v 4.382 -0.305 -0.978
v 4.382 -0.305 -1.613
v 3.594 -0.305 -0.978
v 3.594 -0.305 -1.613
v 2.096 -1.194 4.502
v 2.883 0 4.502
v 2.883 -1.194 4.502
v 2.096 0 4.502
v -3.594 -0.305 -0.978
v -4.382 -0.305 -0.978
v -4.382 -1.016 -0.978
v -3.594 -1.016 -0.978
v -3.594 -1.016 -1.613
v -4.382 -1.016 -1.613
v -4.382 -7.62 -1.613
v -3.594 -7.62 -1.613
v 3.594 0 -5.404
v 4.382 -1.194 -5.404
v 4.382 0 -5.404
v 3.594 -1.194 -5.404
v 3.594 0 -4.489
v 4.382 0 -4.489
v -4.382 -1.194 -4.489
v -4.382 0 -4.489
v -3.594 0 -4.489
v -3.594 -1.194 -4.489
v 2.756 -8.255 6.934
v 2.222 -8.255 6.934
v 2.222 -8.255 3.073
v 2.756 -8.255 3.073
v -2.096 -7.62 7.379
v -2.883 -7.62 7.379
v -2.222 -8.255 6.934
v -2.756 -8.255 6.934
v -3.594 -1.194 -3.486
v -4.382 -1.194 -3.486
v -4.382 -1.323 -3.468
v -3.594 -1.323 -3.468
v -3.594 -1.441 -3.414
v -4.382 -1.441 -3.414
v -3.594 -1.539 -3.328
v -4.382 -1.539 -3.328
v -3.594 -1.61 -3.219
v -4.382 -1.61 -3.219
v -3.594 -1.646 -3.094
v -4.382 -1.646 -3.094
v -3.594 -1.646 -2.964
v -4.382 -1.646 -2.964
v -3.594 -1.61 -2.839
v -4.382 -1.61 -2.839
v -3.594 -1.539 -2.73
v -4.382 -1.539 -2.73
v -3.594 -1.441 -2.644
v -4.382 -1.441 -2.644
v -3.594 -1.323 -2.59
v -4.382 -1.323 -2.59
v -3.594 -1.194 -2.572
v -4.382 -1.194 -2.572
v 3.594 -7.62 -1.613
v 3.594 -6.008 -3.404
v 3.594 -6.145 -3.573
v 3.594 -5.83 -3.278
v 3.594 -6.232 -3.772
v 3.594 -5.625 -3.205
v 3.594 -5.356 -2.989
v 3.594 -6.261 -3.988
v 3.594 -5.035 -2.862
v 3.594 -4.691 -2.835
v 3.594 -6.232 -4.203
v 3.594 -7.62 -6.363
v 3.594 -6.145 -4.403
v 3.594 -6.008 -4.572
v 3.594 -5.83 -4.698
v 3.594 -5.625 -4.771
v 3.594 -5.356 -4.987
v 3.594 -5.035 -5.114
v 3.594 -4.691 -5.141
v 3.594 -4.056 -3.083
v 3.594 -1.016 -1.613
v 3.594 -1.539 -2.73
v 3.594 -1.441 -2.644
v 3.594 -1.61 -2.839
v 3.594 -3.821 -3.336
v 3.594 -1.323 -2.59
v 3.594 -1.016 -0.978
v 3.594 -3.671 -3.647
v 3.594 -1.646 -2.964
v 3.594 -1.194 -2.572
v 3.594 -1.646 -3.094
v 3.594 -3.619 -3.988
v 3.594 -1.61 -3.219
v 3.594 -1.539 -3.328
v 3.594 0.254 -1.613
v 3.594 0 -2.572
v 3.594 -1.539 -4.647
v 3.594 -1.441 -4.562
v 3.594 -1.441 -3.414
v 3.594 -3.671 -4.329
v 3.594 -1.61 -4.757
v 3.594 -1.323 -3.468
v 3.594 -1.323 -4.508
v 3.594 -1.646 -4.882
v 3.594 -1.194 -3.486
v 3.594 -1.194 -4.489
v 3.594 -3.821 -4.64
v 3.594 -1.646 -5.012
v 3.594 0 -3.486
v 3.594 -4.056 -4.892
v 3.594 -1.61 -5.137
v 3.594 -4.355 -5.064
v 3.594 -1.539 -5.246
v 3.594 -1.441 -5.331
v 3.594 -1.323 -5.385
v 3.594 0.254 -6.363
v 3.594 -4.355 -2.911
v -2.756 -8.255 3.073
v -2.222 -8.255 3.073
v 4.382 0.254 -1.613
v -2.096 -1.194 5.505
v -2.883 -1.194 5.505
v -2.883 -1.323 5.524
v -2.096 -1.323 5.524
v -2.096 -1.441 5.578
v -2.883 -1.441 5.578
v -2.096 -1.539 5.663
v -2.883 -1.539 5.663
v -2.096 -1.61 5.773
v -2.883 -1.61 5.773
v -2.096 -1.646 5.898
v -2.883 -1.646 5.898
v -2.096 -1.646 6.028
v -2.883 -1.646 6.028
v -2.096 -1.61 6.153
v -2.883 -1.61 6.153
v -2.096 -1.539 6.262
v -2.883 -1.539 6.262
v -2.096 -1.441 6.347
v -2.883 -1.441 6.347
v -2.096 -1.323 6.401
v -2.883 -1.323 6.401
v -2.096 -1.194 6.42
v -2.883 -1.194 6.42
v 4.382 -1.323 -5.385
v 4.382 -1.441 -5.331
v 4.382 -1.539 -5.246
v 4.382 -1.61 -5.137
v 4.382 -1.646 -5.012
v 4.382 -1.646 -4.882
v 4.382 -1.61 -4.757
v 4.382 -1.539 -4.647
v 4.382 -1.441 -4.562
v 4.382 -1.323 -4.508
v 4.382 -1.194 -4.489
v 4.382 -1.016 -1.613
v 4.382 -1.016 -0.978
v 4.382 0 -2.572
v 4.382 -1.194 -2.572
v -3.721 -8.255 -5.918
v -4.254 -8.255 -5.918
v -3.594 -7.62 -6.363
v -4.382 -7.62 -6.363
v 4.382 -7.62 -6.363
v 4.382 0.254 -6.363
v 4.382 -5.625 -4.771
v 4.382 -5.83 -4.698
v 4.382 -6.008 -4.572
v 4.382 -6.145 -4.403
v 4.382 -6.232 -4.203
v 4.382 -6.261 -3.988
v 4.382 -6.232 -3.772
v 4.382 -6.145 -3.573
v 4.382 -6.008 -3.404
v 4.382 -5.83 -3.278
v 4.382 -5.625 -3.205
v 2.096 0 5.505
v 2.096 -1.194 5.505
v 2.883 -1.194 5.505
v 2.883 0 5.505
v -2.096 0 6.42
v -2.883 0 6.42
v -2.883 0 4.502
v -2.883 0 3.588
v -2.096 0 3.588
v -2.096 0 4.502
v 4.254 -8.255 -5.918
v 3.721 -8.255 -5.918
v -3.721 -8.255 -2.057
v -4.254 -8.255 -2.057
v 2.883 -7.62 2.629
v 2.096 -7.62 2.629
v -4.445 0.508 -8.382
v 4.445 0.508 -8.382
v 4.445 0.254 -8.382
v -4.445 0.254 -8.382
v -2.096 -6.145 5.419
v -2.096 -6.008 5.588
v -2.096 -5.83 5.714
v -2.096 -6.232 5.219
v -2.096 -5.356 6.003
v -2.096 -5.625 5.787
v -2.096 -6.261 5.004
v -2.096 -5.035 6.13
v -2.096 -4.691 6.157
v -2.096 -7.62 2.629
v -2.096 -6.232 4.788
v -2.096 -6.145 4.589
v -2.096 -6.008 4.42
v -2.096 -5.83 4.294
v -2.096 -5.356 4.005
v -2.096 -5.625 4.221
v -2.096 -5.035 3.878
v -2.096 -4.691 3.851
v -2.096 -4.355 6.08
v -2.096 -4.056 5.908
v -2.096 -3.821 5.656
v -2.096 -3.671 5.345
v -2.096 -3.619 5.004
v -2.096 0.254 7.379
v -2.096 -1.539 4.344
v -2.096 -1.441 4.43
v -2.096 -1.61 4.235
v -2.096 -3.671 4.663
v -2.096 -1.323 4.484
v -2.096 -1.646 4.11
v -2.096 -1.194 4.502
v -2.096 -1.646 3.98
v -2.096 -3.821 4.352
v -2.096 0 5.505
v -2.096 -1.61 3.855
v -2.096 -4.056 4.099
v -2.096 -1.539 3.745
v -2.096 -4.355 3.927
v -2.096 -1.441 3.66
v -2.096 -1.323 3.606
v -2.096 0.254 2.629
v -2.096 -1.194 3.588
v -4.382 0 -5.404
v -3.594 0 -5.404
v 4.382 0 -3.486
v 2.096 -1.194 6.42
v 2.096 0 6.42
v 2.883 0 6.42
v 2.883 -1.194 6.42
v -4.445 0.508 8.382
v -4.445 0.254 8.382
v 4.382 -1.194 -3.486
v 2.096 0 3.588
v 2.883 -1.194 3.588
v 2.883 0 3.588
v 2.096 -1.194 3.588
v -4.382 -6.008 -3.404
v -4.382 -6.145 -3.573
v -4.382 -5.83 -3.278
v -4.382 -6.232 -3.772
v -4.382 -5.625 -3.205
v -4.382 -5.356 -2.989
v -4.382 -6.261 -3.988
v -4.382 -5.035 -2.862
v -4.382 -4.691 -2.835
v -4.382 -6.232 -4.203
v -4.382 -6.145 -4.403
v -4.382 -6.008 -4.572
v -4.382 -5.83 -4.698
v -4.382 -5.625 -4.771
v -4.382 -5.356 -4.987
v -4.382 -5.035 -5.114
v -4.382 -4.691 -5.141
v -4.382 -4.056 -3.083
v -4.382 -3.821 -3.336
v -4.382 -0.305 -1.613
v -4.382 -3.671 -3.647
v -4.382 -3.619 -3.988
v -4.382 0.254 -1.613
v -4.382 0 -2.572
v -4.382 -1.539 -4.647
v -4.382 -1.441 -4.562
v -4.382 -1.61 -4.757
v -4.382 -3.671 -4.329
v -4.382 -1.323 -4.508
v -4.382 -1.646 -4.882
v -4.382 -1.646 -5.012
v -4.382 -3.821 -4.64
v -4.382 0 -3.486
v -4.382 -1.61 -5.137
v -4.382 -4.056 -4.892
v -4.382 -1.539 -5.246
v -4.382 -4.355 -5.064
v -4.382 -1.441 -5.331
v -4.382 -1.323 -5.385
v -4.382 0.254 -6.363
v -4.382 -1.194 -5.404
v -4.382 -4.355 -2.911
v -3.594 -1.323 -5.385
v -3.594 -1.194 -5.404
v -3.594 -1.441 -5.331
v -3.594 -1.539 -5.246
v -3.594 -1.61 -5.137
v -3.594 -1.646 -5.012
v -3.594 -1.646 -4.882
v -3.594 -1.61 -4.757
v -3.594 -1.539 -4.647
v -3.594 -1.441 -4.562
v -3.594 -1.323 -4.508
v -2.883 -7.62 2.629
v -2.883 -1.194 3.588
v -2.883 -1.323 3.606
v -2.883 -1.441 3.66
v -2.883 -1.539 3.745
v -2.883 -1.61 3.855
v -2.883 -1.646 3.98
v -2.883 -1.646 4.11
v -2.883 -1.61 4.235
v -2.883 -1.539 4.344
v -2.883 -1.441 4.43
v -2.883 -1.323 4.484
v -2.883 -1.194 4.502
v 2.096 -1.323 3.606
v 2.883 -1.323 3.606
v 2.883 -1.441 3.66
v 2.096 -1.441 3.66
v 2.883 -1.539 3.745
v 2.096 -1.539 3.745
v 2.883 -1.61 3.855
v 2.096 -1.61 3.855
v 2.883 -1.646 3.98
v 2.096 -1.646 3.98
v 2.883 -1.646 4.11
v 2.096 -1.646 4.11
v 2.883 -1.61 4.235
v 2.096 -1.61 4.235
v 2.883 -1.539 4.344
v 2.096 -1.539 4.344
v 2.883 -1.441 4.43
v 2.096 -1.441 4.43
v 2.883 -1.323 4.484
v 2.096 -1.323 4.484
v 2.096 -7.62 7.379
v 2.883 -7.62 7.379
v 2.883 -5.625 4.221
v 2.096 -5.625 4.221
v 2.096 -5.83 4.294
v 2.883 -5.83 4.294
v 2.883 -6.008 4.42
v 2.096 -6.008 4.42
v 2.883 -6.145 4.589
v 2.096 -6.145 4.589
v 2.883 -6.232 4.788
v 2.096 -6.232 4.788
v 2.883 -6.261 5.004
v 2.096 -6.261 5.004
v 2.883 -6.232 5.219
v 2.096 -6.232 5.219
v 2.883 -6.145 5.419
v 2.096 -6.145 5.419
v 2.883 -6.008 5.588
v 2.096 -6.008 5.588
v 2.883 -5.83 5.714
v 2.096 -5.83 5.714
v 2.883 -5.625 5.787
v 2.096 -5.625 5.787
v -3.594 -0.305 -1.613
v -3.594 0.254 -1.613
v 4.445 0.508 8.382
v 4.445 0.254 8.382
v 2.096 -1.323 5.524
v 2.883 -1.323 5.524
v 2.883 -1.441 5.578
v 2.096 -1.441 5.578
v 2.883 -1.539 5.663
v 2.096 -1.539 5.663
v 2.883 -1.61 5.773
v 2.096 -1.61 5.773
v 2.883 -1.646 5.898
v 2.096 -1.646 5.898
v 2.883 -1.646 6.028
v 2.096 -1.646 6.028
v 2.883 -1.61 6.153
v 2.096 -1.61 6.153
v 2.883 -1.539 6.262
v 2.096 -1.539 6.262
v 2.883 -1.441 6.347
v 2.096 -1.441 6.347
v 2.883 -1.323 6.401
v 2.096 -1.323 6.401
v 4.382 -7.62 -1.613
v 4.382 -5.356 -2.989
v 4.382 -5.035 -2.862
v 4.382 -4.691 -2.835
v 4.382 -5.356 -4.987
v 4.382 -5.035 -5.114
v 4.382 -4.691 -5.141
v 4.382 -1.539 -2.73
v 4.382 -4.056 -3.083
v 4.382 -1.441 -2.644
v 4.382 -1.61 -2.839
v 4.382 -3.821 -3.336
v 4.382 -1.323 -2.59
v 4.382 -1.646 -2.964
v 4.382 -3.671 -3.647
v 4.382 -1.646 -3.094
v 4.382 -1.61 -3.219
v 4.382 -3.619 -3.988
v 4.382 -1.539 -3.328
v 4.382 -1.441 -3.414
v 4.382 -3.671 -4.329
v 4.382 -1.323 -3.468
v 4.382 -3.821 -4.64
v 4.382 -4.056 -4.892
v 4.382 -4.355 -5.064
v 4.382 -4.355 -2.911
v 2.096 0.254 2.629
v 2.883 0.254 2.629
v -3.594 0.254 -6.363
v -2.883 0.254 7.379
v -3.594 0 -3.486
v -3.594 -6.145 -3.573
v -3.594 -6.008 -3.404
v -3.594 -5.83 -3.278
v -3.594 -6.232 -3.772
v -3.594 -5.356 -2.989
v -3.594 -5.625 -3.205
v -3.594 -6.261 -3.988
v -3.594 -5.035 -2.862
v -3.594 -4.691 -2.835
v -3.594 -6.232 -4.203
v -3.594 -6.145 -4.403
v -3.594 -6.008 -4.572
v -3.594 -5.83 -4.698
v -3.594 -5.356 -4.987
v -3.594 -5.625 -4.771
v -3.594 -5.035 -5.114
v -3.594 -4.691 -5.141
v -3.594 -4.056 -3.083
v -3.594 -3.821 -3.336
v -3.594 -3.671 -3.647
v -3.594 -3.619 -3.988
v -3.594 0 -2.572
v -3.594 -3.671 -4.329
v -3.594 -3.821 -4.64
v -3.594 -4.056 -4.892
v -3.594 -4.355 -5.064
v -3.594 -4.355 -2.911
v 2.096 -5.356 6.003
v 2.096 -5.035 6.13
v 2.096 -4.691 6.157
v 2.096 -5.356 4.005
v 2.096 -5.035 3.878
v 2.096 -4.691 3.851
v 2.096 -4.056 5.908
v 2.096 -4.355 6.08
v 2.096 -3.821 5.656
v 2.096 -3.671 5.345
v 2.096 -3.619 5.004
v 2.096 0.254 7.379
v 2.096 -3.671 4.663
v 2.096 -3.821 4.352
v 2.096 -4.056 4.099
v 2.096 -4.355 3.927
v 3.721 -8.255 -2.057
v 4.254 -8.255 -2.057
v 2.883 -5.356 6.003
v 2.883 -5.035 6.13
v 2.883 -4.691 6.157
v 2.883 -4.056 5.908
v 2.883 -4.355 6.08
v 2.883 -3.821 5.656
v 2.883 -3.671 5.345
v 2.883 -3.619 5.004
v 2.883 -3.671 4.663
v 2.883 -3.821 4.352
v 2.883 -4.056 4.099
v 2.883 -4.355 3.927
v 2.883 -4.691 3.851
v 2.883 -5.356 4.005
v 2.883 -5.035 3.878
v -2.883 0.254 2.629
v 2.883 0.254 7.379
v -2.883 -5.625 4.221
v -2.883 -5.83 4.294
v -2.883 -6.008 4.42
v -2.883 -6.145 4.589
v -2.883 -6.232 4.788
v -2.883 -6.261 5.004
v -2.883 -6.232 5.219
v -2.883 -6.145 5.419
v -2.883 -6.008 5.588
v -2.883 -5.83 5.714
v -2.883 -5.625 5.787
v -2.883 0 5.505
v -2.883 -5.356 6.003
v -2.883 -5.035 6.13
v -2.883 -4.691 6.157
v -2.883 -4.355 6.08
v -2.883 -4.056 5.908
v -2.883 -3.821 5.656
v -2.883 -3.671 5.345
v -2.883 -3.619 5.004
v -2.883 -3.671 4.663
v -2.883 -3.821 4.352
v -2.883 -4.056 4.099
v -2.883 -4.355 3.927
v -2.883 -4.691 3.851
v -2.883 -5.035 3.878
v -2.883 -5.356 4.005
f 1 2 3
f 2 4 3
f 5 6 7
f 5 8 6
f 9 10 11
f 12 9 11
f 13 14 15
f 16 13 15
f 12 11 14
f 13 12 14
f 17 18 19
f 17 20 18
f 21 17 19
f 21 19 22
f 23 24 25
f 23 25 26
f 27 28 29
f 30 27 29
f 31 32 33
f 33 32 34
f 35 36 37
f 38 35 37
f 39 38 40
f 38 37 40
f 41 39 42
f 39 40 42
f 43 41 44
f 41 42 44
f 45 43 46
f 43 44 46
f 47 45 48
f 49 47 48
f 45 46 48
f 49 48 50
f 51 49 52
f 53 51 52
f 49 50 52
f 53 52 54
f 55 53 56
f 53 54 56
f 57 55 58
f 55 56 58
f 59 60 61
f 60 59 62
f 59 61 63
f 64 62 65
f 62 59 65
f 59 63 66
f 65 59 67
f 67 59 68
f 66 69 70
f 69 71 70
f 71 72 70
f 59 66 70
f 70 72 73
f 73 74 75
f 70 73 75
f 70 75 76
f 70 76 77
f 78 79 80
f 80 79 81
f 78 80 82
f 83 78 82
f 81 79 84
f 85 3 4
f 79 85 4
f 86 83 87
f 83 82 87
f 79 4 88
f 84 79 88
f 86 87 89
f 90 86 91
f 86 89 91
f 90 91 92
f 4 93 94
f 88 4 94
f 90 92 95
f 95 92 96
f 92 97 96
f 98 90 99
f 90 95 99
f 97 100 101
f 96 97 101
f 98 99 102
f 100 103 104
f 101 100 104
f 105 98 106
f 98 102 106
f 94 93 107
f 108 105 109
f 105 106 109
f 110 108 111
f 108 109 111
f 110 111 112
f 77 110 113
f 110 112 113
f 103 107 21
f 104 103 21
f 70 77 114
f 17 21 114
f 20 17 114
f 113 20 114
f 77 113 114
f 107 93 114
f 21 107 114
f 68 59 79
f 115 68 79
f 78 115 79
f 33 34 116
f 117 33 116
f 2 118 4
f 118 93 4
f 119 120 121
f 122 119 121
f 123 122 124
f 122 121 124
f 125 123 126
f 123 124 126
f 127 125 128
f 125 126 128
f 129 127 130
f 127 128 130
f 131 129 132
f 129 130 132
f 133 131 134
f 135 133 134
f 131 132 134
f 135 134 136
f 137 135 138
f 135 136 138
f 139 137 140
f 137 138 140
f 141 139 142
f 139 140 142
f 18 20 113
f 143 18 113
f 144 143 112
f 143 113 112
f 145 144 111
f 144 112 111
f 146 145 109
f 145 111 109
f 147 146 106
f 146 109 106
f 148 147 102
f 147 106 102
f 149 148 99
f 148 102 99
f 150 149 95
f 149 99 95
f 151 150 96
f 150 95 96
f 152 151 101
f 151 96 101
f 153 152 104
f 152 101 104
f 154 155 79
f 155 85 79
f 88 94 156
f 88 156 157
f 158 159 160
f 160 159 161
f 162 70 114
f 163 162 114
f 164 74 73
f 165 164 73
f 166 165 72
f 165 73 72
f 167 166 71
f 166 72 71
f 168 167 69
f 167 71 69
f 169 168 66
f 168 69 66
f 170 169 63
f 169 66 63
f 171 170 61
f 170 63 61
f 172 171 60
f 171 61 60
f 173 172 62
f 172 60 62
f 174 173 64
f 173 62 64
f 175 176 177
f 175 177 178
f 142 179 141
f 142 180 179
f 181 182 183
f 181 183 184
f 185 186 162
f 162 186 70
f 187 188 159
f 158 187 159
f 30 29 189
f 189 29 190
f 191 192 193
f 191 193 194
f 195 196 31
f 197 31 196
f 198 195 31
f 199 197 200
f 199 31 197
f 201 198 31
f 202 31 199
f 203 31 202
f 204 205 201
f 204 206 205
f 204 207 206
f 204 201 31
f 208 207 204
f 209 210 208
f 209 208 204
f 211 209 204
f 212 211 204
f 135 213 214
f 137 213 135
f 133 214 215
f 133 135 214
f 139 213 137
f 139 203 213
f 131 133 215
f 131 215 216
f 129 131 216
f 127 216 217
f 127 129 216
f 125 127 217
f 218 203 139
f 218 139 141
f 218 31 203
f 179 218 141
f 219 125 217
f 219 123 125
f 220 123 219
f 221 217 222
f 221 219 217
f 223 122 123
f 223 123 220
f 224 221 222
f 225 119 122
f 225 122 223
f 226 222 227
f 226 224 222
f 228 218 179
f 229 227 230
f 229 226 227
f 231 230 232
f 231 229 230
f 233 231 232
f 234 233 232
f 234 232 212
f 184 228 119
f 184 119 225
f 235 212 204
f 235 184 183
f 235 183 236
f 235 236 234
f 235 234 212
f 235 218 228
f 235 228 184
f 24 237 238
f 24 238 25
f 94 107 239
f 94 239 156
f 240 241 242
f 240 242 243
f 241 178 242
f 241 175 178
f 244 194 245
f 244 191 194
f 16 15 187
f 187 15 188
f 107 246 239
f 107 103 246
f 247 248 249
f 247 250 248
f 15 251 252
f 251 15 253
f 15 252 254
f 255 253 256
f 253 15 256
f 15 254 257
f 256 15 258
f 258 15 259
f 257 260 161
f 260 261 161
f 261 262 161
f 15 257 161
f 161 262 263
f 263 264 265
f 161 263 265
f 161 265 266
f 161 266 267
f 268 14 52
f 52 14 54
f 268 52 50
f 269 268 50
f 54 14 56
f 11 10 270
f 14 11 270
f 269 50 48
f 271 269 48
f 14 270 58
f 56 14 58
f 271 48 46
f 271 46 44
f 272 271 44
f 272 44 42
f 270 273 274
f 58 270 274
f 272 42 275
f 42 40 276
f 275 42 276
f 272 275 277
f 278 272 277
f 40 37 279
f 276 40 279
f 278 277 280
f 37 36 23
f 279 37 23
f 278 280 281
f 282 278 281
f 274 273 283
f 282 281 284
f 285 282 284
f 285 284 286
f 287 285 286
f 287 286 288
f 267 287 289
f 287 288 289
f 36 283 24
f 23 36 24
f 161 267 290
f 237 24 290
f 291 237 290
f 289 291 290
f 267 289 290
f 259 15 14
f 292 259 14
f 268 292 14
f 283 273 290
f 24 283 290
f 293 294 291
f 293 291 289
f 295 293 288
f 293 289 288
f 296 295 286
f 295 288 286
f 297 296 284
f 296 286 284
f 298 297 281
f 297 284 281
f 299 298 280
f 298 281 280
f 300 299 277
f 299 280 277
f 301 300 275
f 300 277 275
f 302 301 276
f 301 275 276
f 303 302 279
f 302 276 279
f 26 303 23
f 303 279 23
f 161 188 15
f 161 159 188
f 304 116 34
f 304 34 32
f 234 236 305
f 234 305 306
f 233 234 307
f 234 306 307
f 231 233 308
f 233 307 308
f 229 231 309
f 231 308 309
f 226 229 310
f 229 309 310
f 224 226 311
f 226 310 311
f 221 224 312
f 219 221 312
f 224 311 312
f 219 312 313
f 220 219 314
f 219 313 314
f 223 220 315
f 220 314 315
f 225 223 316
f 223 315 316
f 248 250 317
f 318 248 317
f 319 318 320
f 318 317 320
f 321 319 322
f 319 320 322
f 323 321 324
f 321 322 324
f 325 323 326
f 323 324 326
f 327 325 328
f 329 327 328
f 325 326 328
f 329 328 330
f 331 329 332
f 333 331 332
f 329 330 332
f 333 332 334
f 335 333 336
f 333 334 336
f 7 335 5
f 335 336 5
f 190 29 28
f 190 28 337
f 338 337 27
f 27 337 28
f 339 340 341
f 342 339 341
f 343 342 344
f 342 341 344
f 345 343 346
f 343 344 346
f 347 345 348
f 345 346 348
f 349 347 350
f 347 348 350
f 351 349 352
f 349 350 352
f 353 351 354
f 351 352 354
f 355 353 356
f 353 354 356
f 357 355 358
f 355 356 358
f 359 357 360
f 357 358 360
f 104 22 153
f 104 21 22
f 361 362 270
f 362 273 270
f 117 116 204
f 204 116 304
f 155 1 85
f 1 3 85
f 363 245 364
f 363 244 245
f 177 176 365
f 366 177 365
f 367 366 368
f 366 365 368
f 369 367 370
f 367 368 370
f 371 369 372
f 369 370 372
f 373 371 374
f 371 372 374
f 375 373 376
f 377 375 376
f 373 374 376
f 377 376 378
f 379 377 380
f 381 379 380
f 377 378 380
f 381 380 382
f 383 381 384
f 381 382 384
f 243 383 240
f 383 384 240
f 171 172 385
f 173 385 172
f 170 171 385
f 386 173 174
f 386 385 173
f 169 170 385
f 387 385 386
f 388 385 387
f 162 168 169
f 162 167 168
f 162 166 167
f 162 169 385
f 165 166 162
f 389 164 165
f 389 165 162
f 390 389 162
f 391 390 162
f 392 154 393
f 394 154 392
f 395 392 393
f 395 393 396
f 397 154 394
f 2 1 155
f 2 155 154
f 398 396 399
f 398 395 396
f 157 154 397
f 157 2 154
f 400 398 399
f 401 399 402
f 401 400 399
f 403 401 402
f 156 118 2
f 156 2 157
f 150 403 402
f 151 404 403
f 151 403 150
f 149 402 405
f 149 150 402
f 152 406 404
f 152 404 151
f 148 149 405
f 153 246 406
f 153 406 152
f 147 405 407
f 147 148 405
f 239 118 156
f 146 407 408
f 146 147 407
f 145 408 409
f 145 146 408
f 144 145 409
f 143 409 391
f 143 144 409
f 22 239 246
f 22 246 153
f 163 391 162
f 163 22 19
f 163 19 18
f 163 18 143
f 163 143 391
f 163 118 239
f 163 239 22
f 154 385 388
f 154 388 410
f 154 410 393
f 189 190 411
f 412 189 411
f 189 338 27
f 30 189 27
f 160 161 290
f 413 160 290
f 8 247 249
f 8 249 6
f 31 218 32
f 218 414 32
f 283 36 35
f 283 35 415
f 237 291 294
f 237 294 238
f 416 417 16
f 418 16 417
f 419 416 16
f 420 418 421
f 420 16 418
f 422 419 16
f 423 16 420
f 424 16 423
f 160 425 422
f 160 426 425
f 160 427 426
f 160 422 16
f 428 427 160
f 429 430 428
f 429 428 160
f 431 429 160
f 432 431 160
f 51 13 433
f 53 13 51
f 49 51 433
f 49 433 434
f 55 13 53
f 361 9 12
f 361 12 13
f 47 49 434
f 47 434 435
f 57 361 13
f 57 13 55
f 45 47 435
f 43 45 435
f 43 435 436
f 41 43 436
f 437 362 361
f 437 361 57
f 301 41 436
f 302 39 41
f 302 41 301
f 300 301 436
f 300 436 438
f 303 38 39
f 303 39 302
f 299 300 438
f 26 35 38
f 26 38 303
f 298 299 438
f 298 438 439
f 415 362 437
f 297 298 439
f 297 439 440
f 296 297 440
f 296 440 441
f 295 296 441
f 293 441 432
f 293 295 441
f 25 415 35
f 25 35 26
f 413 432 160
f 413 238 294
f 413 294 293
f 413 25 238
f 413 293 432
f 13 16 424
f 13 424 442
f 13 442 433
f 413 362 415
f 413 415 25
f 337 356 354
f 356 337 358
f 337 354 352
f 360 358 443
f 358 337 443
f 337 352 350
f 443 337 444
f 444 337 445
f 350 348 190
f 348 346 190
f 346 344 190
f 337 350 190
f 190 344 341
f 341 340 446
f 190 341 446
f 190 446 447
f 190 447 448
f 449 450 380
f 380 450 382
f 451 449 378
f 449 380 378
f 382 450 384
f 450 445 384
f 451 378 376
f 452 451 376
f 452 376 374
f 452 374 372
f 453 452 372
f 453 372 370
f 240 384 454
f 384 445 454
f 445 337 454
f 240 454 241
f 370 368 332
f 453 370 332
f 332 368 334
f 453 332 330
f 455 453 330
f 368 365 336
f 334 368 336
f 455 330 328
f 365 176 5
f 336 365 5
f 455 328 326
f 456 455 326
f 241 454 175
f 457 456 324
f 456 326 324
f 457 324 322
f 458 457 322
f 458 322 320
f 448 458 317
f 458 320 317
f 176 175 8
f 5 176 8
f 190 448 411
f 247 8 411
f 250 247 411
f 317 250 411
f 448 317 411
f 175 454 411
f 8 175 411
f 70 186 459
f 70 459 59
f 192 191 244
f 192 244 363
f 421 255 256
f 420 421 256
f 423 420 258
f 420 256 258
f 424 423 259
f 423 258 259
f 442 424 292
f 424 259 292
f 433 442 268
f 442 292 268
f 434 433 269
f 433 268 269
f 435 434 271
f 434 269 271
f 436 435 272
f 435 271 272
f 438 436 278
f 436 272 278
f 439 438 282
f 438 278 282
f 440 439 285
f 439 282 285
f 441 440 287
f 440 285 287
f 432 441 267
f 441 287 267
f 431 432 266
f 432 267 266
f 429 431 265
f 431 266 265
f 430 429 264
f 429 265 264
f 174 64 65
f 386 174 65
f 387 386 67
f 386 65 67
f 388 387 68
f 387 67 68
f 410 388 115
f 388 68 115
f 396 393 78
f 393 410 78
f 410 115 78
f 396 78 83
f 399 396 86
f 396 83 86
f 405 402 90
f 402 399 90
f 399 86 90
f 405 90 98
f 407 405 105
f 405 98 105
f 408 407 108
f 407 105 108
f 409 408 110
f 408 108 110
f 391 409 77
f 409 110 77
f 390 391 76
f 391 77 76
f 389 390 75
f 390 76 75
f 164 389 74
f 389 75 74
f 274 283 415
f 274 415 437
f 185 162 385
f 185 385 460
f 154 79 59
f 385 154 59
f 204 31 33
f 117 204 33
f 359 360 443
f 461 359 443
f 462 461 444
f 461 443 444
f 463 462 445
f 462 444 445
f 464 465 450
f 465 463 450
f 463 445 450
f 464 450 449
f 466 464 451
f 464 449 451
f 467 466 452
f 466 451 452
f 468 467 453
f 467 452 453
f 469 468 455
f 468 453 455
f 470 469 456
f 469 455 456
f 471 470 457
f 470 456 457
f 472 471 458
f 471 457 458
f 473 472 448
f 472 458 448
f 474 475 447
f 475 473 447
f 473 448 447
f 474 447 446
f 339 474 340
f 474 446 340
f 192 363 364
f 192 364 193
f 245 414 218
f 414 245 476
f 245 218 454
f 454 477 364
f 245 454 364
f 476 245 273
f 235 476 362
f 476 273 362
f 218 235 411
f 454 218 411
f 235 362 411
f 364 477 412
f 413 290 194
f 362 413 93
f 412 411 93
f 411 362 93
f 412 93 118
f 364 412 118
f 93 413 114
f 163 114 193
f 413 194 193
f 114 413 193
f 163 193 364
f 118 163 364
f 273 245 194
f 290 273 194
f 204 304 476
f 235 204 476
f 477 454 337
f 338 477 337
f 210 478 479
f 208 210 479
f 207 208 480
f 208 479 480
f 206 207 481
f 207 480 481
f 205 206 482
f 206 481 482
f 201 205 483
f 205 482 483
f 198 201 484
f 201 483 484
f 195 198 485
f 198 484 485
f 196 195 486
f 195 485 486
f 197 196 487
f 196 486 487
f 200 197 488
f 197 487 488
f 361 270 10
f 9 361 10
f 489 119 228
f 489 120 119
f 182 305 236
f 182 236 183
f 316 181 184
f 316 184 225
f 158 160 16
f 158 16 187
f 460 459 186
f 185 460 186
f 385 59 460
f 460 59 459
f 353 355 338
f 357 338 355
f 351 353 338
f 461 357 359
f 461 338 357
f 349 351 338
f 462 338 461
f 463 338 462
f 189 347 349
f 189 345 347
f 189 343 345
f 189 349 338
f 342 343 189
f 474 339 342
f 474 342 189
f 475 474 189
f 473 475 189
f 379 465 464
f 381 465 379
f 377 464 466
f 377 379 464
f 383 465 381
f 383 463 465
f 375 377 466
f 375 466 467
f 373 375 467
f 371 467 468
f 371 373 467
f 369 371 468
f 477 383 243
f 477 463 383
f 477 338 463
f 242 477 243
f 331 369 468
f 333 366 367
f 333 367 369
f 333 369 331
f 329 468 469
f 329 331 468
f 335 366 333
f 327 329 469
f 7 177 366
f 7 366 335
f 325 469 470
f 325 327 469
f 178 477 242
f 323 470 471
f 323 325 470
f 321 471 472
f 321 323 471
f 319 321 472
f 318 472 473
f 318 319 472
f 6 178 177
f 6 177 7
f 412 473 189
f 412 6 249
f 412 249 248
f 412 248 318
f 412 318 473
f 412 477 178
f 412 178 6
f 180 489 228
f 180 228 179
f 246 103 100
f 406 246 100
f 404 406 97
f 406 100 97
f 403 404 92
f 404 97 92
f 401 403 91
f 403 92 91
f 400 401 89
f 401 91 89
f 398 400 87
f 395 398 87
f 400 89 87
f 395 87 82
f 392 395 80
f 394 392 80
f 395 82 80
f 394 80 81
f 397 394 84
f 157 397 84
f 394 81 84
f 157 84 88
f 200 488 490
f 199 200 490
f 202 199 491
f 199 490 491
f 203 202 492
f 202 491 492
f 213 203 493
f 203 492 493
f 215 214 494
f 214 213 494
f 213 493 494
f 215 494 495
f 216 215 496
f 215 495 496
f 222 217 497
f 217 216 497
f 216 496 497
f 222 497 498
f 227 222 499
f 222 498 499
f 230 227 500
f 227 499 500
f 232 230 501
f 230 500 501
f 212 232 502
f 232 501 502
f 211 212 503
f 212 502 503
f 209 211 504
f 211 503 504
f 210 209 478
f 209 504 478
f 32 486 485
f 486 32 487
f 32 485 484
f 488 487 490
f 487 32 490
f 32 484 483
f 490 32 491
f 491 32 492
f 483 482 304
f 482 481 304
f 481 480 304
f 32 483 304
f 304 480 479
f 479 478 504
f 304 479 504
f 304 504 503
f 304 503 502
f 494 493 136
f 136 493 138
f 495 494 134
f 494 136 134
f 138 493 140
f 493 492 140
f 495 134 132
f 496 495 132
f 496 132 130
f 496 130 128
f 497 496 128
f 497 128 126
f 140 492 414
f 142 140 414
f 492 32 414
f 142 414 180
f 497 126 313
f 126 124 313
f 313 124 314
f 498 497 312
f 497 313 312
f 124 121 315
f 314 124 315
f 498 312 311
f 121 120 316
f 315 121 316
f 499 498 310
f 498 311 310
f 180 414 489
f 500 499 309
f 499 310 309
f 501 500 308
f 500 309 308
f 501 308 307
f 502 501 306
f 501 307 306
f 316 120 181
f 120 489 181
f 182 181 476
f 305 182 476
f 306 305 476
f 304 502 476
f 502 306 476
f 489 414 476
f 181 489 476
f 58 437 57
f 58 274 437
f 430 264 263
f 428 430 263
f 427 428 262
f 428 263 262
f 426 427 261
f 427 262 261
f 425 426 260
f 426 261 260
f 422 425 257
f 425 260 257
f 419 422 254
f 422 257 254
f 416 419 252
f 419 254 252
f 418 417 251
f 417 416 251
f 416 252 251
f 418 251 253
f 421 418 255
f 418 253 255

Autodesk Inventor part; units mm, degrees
sketch "Sketch_1" plane through (0, 0.508, 0) normal (0, 1, 0) x (1, 0, 0)
  line L0 (-4.445, 8.382) -> (-4.445, -8.382)
  line L1 (-4.445, -8.382) -> (4.445, -8.382)
  line L2 (4.445, -8.382) -> (4.445, 8.382)
  line L3 (4.445, 8.382) -> (-4.445, 8.382)
extrude "Extrusion1" add sketch "Sketch_1" against normal blind 0.254
sketch "Sketch_2" plane through (-2.4892, 0, 0) normal (1, 0, 0) x (0, 0, -1)
  line L0 (-7.3787, -7.62) -> (-6.9342, -8.255)
  line L1 (-6.9342, -8.255) -> (-3.0734, -8.255)
  line L2 (-3.0734, -8.255) -> (-2.6289, -7.62)
  line L3 (-2.6289, -7.62) -> (-2.6289, 0.508)
  line L4 (-2.6289, 0.508) -> (-7.3787, 0.508)
  line L5 (-7.3787, 0.508) -> (-7.3787, -7.62)
  arc A0 (-4.2207, -5.6252) -> (-5.7869, -5.6252) centre (-5.0038, -4.7752) ccw
  arc A1 (-5.7869, -5.6252) -> (-4.2207, -5.6252) centre (-5.0038, -5.461) ccw
extrude "Extrusion2" add sketch "Sketch_2" along normal mid plane 0.7874
sketch "Sketch_3" plane through (2.4892, 0, 0) normal (1, 0, 0) x (0, 0, -1)
  line L0 (-7.3787, -7.62) -> (-6.9342, -8.255)
  line L1 (-6.9342, -8.255) -> (-3.0734, -8.255)
  line L2 (-3.0734, -8.255) -> (-2.6289, -7.62)
  line L3 (-2.6289, -7.62) -> (-2.6289, 0.508)
  line L4 (-2.6289, 0.508) -> (-7.3787, 0.508)
  line L5 (-7.3787, 0.508) -> (-7.3787, -7.62)
  arc A0 (-4.2207, -5.6252) -> (-5.7869, -5.6252) centre (-5.0038, -4.7752) ccw
  arc A1 (-5.7869, -5.6252) -> (-4.2207, -5.6252) centre (-5.0038, -5.461) ccw
extrude "Extrusion3" add sketch "Sketch_3" along normal mid plane 0.7874
sketch "Sketch_4" plane through (-3.9878, 0, 0) normal (1, 0, 0) x (0, 0, -1)
  line L0 (0.9779, -0.3048) -> (0.9779, -1.016)
  line L1 (0.9779, -1.016) -> (1.6129, -1.016)
  line L2 (1.6129, -1.016) -> (1.6129, -7.62)
  line L3 (1.6129, -7.62) -> (2.0574, -8.255)
  line L4 (2.0574, -8.255) -> (5.9182, -8.255)
  line L5 (5.9182, -8.255) -> (6.3627, -7.62)
  line L6 (6.3627, -7.62) -> (6.3627, 0.508)
  line L7 (6.3627, 0.508) -> (1.6129, 0.508)
  line L8 (1.6129, 0.508) -> (1.6129, -0.3048)
  line L9 (1.6129, -0.3048) -> (0.9779, -0.3048)
  arc A0 (4.7709, -5.6252) -> (3.2047, -5.6252) centre (3.9878, -4.7752) ccw
  arc A1 (3.2047, -5.6252) -> (4.7709, -5.6252) centre (3.9878, -5.461) ccw
extrude "Extrusion4" add sketch "Sketch_4" along normal mid plane 0.7874
sketch "Sketch_5" plane through (3.9878, 0, 0) normal (1, 0, 0) x (0, 0, -1)
  line L0 (0.9779, -0.3048) -> (0.9779, -1.016)
  line L1 (0.9779, -1.016) -> (1.6129, -1.016)
  line L2 (1.6129, -1.016) -> (1.6129, -7.62)
  line L3 (1.6129, -7.62) -> (2.0574, -8.255)
  line L4 (2.0574, -8.255) -> (5.9182, -8.255)
  line L5 (5.9182, -8.255) -> (6.3627, -7.62)
  line L6 (6.3627, -7.62) -> (6.3627, 0.508)
  line L7 (6.3627, 0.508) -> (1.6129, 0.508)
  line L8 (1.6129, 0.508) -> (1.6129, -0.3048)
  line L9 (1.6129, -0.3048) -> (0.9779, -0.3048)
  arc A0 (4.7709, -5.6252) -> (3.2047, -5.6252) centre (3.9878, -4.7752) ccw
  arc A1 (3.2047, -5.6252) -> (4.7709, -5.6252) centre (3.9878, -5.461) ccw
extrude "Extrusion5" add sketch "Sketch_5" along normal mid plane 0.7874
sketch "Sketch_6" plane through (0, 0, 0) normal (0, 0, 1) x (1, 0, 0)
  line L0 (-5.08, -8.636) -> (5.08, -8.636)
  line L1 (5.08, -8.636) -> (5.08, 0)
  line L2 (5.08, 0) -> (4.3815, 0)
  line L3 (4.3815, 0) -> (4.3815, -7.62)
  line L4 (4.3815, -7.62) -> (4.2545, -8.255)
  line L5 (4.2545, -8.255) -> (3.7211, -8.255)
  line L6 (3.7211, -8.255) -> (3.5941, -7.62)
  line L7 (3.5941, -7.62) -> (3.5941, 0)
  line L8 (3.5941, 0) -> (2.8829, 0)
  line L9 (2.8829, 0) -> (2.8829, -7.62)
  line L10 (2.8829, -7.62) -> (2.7559, -8.255)
  line L11 (2.7559, -8.255) -> (2.2225, -8.255)
  line L12 (2.2225, -8.255) -> (2.0955, -7.62)
  line L13 (2.0955, -7.62) -> (2.0955, 0)
  line L14 (2.0955, 0) -> (-2.0955, 0)
  line L15 (-2.0955, 0) -> (-2.0955, -7.62)
  line L16 (-2.0955, -7.62) -> (-2.2225, -8.255)
  line L17 (-2.2225, -8.255) -> (-2.7559, -8.255)
  line L18 (-2.7559, -8.255) -> (-2.8829, -7.62)
  line L19 (-2.8829, -7.62) -> (-2.8829, 0)
  line L20 (-2.8829, 0) -> (-3.5941, 0)
  line L21 (-3.5941, 0) -> (-3.5941, -7.62)
  line L22 (-3.5941, -7.62) -> (-3.7211, -8.255)
  line L23 (-3.7211, -8.255) -> (-4.2545, -8.255)
  line L24 (-4.2545, -8.255) -> (-4.3815, -7.62)
  line L25 (-4.3815, -7.62) -> (-4.3815, 0)
  line L26 (-4.3815, 0) -> (-5.08, 0)
  line L27 (-5.08, 0) -> (-5.08, -8.636)
extrude "Extrusion6" cut sketch "Sketch_6" along normal mid plane 17.78
sketch "Sketch_8" plane through (0, 0, 0) normal (1, 0, 0) x (0, 1, 0)
  line L0 (0, 6.4198) -> (-1.1938, 6.4198)
  arc A0 (-1.1938, 6.4198) -> (-1.1938, 5.5054) centre (-1.1938, 5.9626) ccw
  line L1 (-1.1938, 5.5054) -> (0, 5.5054)
  line L2 (0, 5.5054) -> (0, 6.4198)
extrude "Extrusion7" cut sketch "Sketch_8" along normal mid plane 17.78
sketch "Sketch_9" plane through (0, 0, 0) normal (1, 0, 0) x (0, 1, 0)
  line L0 (0, 4.5021) -> (-1.1938, 4.5021)
  arc A0 (-1.1938, 4.5021) -> (-1.1938, 3.5877) centre (-1.1938, 4.0449) ccw
  line L1 (-1.1938, 3.5877) -> (0, 3.5877)
  line L2 (0, 3.5877) -> (0, 4.5021)
extrude "Extrusion8" cut sketch "Sketch_9" along normal mid plane 17.78
sketch "Sketch_10" plane through (0, 0, 0) normal (1, 0, 0) x (0, 1, 0)
  line L0 (0, -2.5718) -> (-1.1938, -2.5718)
  arc A0 (-1.1938, -2.5718) -> (-1.1938, -3.4862) centre (-1.1938, -3.029) ccw
  line L1 (-1.1938, -3.4862) -> (0, -3.4862)
  line L2 (0, -3.4862) -> (0, -2.5718)
extrude "Extrusion9" cut sketch "Sketch_10" along normal mid plane 17.78
sketch "Sketch_11" plane through (0, 0, 0) normal (1, 0, 0) x (0, 1, 0)
  line L0 (0, -4.4894) -> (-1.1938, -4.4894)
  arc A0 (-1.1938, -4.4894) -> (-1.1938, -5.4039) centre (-1.1938, -4.9466) ccw
  line L1 (-1.1938, -5.4039) -> (0, -5.4039)
  line L2 (0, -5.4039) -> (0, -4.4894)
extrude "Extrusion10" cut sketch "Sketch_11" along normal mid plane 17.78
ref_plane "to_body_XY" through (0, 0, 0) normal (0, -1, 0) x (1, 0, 0)
ref_plane "to_body_YZ" through (0, 0, 0) normal (1, 0, 0) x (0, 0, 1)
ref_plane "to_body_ZX" through (0, 0, 0) normal (0, 0, 1) x (0, -1, 0)
properties part number "CWSB2F-nonillumin_trmnls"
